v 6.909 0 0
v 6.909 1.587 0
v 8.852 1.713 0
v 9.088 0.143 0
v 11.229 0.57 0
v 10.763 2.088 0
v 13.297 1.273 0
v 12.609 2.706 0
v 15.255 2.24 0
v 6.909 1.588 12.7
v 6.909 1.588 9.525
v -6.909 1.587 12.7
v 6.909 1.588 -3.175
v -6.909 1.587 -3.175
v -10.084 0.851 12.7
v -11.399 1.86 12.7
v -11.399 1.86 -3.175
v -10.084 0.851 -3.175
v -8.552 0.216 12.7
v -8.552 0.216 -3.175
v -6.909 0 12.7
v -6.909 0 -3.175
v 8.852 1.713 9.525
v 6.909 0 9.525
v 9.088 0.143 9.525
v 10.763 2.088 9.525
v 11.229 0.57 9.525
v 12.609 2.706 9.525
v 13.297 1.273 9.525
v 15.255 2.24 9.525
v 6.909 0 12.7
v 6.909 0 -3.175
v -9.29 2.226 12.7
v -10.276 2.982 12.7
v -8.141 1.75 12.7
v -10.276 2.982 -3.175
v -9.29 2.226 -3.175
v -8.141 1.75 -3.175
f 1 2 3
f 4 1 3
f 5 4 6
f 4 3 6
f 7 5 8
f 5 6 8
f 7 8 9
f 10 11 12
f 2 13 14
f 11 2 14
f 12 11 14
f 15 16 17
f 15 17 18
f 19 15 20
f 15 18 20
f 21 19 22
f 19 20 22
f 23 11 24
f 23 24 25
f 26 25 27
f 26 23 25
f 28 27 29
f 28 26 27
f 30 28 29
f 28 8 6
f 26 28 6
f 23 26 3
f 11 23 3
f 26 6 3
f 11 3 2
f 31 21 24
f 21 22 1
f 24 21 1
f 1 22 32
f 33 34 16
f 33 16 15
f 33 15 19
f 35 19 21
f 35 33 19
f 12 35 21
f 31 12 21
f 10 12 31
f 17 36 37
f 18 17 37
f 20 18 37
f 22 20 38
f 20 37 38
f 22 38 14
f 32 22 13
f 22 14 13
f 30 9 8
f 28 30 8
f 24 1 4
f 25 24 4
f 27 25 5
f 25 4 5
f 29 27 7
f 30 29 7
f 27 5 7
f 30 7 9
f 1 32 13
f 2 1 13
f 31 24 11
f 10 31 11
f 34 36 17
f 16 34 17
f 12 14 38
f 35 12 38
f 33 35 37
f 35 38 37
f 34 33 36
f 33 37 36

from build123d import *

# Parameters (mm, degrees)
BOSS_EXTRUDE1_DEPTH = 9.525
BOSS_EXTRUDE2_DEPTH = 3.175
BOSS_EXTRUDE3_START = -12.7
BOSS_EXTRUDE3_DEPTH = 3.175


with BuildPart() as part:
    # Sketch1 → Boss-Extrude1 (new body)
    with BuildSketch(Plane.XY):
        with BuildLine():
            Line((-6.9088, 0), (6.9088, 0))
            ThreePointArc((6.9088, 0), (11.229329629, 0.569673931), (15.254541002, 2.239757184))
            Line((15.254541002, 2.239757184), (12.609003955, 2.706236743))
            ThreePointArc((12.609003955, 2.706236743), (9.813274868, 1.869826819), (6.9088, 1.5875))
            Line((6.9088, 1.5875), (-6.9088, 1.5875))
            ThreePointArc((-6.9088, 1.5875), (-8.731329847, 1.950023726), (-10.276396045, 2.982403955))
            Line((-10.276396045, 2.982403955), (-11.398928061, 1.859871939))
            ThreePointArc((-11.398928061, 1.859871939), (-9.338839796, 0.483364969), (-6.9088, 0))
        make_face()
    extrude(amount=BOSS_EXTRUDE1_DEPTH)

    # Sketch2 → Boss-Extrude2 (add)
    with BuildSketch(Plane.XY.offset(9.525)):
        with BuildLine():
            Line((6.9088, 0), (6.9088, 1.5875))
            Line((6.9088, 1.5875), (-6.9088, 1.5875))
            ThreePointArc((-6.9088, 1.5875), (-8.731329847, 1.950023726), (-10.276396045, 2.982403955))
            Line((-10.276396045, 2.982403955), (-11.398928061, 1.859871939))
            ThreePointArc((-11.398928061, 1.859871939), (-9.338839796, 0.483364969), (-6.9088, 0))
            Line((-6.9088, 0), (6.9088, 0))
        make_face()
    extrude(amount=BOSS_EXTRUDE2_DEPTH)

    # Sketch2<2> → Boss-Extrude3 (add)
    with BuildSketch(Plane.XY.offset(9.525).offset(BOSS_EXTRUDE3_START)):
        with BuildLine():
            Line((-6.9088, 0), (6.9088, 0))
            Line((6.9088, 0), (6.9088, 1.5875))
            Line((6.9088, 1.5875), (-6.9088, 1.5875))
            ThreePointArc((-6.9088, 1.5875), (-8.731329847, 1.950023726), (-10.276396045, 2.982403955))
            Line((-10.276396045, 2.982403955), (-11.398928061, 1.859871939))
            ThreePointArc((-11.398928061, 1.859871939), (-9.338839796, 0.483364969), (-6.9088, 0))
        make_face()
    extrude(amount=BOSS_EXTRUDE3_DEPTH)


solid = part.part
